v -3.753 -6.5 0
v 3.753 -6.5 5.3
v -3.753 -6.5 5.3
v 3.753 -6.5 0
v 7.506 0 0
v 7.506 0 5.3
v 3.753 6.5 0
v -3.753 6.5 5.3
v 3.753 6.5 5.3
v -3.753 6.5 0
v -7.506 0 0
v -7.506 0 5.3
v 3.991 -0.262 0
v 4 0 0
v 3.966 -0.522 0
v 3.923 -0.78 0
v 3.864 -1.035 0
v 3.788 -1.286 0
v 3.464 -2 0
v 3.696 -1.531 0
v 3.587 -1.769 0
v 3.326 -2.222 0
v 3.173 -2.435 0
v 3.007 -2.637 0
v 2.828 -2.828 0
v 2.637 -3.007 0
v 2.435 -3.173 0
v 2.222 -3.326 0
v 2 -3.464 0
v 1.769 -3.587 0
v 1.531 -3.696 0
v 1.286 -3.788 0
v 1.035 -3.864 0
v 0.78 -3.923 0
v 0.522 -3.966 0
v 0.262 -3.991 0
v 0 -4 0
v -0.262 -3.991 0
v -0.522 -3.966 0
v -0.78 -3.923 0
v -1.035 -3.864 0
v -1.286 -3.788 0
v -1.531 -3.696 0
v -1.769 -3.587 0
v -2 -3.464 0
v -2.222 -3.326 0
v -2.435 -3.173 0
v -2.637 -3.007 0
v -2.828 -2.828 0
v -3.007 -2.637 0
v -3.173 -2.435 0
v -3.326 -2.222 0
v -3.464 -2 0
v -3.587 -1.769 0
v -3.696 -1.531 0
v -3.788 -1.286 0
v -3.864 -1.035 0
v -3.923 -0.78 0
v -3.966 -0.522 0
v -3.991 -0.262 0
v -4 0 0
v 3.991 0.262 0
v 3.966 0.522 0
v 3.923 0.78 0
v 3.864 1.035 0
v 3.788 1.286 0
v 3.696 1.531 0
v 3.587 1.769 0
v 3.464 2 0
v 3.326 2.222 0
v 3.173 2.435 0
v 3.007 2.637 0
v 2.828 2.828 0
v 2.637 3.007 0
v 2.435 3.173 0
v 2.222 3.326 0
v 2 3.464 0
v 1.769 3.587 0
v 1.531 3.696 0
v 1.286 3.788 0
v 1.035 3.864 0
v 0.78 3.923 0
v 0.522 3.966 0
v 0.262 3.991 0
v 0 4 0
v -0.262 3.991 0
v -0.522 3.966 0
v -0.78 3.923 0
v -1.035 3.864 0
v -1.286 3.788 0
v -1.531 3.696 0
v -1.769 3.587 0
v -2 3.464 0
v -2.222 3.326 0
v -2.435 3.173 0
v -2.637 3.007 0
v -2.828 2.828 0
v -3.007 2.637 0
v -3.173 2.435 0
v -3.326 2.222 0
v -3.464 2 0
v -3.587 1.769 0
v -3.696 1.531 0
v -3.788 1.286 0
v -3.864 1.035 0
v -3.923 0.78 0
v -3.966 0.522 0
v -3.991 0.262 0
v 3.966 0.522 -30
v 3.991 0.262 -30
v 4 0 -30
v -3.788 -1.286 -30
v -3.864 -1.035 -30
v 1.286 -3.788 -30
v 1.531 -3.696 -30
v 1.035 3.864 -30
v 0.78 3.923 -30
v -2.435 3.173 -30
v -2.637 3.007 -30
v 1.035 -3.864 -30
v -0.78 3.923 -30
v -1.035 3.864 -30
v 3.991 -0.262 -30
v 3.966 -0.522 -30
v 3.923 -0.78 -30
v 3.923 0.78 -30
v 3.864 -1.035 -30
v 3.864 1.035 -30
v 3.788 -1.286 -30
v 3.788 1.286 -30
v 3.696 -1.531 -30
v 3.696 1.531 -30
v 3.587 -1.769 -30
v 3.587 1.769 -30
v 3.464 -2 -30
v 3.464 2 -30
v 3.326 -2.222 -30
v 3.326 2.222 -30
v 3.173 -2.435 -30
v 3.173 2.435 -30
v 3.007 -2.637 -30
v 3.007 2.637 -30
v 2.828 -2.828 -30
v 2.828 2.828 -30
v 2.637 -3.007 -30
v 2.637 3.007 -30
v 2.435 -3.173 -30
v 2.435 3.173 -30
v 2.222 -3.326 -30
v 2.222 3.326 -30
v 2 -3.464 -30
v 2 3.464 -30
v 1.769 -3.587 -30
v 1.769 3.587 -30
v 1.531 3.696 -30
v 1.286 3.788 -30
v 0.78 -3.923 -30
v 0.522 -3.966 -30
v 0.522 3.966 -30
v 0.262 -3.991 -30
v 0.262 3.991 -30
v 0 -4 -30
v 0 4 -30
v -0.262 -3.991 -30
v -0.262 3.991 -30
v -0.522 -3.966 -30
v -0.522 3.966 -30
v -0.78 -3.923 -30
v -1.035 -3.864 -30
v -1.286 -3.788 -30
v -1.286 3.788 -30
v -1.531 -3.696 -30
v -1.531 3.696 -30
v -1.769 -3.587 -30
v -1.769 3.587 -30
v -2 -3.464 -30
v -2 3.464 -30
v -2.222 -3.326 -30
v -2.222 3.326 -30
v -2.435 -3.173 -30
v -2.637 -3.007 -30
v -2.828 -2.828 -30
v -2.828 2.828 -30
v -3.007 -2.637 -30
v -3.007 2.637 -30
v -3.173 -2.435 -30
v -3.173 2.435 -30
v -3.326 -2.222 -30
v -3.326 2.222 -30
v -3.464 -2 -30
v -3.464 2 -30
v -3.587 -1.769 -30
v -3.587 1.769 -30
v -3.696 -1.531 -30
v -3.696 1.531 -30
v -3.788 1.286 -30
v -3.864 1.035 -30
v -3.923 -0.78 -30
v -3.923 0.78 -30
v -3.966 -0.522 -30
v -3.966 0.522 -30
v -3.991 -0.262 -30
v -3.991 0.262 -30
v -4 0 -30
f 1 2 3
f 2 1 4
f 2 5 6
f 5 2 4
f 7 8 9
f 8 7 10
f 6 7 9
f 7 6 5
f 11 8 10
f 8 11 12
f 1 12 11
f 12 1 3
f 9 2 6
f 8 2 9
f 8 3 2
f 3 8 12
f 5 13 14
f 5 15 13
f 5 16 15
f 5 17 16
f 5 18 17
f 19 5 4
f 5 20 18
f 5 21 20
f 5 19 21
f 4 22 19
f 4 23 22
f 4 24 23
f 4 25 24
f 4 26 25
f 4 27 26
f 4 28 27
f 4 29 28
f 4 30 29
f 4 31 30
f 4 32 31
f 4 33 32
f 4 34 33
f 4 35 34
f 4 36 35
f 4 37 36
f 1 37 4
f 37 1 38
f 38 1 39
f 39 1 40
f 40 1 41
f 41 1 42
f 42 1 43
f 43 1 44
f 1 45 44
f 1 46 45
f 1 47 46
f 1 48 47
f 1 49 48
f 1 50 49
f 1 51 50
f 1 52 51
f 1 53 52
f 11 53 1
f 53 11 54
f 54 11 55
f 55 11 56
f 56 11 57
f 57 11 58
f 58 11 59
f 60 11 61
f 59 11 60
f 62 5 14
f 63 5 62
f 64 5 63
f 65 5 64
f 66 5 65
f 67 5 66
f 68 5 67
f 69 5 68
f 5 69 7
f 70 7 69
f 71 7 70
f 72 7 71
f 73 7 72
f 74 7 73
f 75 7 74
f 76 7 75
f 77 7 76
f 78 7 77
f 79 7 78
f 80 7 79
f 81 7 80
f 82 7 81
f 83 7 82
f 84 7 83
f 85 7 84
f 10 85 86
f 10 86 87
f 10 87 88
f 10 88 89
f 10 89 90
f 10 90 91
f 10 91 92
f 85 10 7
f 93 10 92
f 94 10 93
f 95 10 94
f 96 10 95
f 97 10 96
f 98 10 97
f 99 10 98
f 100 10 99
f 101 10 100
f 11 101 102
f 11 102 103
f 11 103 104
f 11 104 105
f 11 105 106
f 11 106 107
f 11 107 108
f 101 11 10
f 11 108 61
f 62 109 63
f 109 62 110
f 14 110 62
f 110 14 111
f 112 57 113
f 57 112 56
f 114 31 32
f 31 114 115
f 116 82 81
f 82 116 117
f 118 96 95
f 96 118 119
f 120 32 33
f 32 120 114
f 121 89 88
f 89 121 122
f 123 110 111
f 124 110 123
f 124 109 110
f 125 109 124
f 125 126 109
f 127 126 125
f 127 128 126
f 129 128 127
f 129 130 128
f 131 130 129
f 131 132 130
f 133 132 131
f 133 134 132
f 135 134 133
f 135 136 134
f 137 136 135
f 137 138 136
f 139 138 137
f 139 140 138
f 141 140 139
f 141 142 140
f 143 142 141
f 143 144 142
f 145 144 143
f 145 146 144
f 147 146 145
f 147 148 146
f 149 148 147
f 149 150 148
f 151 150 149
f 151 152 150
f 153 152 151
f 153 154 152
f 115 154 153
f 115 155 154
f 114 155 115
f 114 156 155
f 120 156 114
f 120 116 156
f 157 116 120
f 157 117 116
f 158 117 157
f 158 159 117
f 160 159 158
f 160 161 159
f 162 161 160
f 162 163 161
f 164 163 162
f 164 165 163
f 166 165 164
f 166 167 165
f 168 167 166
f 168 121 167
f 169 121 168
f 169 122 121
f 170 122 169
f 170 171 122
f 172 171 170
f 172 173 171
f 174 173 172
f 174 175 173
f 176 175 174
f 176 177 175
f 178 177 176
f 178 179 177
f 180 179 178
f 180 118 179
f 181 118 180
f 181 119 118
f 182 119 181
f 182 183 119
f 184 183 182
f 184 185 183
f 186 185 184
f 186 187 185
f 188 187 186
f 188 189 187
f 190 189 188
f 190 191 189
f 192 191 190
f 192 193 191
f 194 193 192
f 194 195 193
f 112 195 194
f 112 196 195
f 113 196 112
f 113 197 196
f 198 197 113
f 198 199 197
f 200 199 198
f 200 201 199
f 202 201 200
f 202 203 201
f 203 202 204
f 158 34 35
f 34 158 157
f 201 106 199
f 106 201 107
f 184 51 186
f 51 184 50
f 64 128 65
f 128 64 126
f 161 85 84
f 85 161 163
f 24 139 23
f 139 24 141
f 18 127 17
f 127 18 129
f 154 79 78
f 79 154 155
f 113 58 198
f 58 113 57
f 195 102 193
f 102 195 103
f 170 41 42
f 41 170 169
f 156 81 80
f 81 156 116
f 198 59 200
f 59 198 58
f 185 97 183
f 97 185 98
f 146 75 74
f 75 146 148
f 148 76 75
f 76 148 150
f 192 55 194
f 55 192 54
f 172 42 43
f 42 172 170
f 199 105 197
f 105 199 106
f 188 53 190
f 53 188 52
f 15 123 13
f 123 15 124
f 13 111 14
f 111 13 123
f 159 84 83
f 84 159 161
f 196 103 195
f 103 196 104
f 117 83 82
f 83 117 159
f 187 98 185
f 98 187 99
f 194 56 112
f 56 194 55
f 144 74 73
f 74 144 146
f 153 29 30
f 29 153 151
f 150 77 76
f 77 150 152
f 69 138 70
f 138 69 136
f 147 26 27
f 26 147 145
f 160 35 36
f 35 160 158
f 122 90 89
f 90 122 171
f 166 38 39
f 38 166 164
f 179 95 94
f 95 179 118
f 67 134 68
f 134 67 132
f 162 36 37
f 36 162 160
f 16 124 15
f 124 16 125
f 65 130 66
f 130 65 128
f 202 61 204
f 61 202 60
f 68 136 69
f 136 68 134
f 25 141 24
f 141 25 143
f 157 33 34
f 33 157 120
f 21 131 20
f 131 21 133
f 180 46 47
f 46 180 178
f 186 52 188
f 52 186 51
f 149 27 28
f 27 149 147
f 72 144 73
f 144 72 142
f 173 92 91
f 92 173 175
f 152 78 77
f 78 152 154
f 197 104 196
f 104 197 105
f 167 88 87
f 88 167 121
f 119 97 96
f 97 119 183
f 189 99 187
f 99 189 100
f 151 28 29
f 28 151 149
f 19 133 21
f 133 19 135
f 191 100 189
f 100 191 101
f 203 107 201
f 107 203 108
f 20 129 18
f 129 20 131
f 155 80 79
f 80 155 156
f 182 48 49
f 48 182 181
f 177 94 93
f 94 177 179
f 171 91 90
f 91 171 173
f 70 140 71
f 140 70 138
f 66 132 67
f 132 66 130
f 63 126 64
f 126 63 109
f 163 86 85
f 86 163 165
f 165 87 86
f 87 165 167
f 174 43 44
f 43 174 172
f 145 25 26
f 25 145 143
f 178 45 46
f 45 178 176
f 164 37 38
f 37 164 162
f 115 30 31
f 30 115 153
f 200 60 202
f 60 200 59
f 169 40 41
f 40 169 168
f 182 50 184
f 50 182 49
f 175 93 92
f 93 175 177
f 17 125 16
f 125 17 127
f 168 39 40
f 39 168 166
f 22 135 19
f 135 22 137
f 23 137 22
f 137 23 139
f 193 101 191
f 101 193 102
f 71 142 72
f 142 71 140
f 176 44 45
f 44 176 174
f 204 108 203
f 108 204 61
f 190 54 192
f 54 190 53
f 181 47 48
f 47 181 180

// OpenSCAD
head_across_flats = 13;
head_height = 5.3;
shank_diameter = 8;
shank_length = 30;

union() {
    cylinder(
        d = head_across_flats / cos(30),
        h = head_height,
        center = false,
        $fn = 6
    );

    translate([0, 0, -shank_length])
        cylinder(
            d = shank_diameter,
            h = shank_length,
            center = false,
            $fn = 96
        );
}
